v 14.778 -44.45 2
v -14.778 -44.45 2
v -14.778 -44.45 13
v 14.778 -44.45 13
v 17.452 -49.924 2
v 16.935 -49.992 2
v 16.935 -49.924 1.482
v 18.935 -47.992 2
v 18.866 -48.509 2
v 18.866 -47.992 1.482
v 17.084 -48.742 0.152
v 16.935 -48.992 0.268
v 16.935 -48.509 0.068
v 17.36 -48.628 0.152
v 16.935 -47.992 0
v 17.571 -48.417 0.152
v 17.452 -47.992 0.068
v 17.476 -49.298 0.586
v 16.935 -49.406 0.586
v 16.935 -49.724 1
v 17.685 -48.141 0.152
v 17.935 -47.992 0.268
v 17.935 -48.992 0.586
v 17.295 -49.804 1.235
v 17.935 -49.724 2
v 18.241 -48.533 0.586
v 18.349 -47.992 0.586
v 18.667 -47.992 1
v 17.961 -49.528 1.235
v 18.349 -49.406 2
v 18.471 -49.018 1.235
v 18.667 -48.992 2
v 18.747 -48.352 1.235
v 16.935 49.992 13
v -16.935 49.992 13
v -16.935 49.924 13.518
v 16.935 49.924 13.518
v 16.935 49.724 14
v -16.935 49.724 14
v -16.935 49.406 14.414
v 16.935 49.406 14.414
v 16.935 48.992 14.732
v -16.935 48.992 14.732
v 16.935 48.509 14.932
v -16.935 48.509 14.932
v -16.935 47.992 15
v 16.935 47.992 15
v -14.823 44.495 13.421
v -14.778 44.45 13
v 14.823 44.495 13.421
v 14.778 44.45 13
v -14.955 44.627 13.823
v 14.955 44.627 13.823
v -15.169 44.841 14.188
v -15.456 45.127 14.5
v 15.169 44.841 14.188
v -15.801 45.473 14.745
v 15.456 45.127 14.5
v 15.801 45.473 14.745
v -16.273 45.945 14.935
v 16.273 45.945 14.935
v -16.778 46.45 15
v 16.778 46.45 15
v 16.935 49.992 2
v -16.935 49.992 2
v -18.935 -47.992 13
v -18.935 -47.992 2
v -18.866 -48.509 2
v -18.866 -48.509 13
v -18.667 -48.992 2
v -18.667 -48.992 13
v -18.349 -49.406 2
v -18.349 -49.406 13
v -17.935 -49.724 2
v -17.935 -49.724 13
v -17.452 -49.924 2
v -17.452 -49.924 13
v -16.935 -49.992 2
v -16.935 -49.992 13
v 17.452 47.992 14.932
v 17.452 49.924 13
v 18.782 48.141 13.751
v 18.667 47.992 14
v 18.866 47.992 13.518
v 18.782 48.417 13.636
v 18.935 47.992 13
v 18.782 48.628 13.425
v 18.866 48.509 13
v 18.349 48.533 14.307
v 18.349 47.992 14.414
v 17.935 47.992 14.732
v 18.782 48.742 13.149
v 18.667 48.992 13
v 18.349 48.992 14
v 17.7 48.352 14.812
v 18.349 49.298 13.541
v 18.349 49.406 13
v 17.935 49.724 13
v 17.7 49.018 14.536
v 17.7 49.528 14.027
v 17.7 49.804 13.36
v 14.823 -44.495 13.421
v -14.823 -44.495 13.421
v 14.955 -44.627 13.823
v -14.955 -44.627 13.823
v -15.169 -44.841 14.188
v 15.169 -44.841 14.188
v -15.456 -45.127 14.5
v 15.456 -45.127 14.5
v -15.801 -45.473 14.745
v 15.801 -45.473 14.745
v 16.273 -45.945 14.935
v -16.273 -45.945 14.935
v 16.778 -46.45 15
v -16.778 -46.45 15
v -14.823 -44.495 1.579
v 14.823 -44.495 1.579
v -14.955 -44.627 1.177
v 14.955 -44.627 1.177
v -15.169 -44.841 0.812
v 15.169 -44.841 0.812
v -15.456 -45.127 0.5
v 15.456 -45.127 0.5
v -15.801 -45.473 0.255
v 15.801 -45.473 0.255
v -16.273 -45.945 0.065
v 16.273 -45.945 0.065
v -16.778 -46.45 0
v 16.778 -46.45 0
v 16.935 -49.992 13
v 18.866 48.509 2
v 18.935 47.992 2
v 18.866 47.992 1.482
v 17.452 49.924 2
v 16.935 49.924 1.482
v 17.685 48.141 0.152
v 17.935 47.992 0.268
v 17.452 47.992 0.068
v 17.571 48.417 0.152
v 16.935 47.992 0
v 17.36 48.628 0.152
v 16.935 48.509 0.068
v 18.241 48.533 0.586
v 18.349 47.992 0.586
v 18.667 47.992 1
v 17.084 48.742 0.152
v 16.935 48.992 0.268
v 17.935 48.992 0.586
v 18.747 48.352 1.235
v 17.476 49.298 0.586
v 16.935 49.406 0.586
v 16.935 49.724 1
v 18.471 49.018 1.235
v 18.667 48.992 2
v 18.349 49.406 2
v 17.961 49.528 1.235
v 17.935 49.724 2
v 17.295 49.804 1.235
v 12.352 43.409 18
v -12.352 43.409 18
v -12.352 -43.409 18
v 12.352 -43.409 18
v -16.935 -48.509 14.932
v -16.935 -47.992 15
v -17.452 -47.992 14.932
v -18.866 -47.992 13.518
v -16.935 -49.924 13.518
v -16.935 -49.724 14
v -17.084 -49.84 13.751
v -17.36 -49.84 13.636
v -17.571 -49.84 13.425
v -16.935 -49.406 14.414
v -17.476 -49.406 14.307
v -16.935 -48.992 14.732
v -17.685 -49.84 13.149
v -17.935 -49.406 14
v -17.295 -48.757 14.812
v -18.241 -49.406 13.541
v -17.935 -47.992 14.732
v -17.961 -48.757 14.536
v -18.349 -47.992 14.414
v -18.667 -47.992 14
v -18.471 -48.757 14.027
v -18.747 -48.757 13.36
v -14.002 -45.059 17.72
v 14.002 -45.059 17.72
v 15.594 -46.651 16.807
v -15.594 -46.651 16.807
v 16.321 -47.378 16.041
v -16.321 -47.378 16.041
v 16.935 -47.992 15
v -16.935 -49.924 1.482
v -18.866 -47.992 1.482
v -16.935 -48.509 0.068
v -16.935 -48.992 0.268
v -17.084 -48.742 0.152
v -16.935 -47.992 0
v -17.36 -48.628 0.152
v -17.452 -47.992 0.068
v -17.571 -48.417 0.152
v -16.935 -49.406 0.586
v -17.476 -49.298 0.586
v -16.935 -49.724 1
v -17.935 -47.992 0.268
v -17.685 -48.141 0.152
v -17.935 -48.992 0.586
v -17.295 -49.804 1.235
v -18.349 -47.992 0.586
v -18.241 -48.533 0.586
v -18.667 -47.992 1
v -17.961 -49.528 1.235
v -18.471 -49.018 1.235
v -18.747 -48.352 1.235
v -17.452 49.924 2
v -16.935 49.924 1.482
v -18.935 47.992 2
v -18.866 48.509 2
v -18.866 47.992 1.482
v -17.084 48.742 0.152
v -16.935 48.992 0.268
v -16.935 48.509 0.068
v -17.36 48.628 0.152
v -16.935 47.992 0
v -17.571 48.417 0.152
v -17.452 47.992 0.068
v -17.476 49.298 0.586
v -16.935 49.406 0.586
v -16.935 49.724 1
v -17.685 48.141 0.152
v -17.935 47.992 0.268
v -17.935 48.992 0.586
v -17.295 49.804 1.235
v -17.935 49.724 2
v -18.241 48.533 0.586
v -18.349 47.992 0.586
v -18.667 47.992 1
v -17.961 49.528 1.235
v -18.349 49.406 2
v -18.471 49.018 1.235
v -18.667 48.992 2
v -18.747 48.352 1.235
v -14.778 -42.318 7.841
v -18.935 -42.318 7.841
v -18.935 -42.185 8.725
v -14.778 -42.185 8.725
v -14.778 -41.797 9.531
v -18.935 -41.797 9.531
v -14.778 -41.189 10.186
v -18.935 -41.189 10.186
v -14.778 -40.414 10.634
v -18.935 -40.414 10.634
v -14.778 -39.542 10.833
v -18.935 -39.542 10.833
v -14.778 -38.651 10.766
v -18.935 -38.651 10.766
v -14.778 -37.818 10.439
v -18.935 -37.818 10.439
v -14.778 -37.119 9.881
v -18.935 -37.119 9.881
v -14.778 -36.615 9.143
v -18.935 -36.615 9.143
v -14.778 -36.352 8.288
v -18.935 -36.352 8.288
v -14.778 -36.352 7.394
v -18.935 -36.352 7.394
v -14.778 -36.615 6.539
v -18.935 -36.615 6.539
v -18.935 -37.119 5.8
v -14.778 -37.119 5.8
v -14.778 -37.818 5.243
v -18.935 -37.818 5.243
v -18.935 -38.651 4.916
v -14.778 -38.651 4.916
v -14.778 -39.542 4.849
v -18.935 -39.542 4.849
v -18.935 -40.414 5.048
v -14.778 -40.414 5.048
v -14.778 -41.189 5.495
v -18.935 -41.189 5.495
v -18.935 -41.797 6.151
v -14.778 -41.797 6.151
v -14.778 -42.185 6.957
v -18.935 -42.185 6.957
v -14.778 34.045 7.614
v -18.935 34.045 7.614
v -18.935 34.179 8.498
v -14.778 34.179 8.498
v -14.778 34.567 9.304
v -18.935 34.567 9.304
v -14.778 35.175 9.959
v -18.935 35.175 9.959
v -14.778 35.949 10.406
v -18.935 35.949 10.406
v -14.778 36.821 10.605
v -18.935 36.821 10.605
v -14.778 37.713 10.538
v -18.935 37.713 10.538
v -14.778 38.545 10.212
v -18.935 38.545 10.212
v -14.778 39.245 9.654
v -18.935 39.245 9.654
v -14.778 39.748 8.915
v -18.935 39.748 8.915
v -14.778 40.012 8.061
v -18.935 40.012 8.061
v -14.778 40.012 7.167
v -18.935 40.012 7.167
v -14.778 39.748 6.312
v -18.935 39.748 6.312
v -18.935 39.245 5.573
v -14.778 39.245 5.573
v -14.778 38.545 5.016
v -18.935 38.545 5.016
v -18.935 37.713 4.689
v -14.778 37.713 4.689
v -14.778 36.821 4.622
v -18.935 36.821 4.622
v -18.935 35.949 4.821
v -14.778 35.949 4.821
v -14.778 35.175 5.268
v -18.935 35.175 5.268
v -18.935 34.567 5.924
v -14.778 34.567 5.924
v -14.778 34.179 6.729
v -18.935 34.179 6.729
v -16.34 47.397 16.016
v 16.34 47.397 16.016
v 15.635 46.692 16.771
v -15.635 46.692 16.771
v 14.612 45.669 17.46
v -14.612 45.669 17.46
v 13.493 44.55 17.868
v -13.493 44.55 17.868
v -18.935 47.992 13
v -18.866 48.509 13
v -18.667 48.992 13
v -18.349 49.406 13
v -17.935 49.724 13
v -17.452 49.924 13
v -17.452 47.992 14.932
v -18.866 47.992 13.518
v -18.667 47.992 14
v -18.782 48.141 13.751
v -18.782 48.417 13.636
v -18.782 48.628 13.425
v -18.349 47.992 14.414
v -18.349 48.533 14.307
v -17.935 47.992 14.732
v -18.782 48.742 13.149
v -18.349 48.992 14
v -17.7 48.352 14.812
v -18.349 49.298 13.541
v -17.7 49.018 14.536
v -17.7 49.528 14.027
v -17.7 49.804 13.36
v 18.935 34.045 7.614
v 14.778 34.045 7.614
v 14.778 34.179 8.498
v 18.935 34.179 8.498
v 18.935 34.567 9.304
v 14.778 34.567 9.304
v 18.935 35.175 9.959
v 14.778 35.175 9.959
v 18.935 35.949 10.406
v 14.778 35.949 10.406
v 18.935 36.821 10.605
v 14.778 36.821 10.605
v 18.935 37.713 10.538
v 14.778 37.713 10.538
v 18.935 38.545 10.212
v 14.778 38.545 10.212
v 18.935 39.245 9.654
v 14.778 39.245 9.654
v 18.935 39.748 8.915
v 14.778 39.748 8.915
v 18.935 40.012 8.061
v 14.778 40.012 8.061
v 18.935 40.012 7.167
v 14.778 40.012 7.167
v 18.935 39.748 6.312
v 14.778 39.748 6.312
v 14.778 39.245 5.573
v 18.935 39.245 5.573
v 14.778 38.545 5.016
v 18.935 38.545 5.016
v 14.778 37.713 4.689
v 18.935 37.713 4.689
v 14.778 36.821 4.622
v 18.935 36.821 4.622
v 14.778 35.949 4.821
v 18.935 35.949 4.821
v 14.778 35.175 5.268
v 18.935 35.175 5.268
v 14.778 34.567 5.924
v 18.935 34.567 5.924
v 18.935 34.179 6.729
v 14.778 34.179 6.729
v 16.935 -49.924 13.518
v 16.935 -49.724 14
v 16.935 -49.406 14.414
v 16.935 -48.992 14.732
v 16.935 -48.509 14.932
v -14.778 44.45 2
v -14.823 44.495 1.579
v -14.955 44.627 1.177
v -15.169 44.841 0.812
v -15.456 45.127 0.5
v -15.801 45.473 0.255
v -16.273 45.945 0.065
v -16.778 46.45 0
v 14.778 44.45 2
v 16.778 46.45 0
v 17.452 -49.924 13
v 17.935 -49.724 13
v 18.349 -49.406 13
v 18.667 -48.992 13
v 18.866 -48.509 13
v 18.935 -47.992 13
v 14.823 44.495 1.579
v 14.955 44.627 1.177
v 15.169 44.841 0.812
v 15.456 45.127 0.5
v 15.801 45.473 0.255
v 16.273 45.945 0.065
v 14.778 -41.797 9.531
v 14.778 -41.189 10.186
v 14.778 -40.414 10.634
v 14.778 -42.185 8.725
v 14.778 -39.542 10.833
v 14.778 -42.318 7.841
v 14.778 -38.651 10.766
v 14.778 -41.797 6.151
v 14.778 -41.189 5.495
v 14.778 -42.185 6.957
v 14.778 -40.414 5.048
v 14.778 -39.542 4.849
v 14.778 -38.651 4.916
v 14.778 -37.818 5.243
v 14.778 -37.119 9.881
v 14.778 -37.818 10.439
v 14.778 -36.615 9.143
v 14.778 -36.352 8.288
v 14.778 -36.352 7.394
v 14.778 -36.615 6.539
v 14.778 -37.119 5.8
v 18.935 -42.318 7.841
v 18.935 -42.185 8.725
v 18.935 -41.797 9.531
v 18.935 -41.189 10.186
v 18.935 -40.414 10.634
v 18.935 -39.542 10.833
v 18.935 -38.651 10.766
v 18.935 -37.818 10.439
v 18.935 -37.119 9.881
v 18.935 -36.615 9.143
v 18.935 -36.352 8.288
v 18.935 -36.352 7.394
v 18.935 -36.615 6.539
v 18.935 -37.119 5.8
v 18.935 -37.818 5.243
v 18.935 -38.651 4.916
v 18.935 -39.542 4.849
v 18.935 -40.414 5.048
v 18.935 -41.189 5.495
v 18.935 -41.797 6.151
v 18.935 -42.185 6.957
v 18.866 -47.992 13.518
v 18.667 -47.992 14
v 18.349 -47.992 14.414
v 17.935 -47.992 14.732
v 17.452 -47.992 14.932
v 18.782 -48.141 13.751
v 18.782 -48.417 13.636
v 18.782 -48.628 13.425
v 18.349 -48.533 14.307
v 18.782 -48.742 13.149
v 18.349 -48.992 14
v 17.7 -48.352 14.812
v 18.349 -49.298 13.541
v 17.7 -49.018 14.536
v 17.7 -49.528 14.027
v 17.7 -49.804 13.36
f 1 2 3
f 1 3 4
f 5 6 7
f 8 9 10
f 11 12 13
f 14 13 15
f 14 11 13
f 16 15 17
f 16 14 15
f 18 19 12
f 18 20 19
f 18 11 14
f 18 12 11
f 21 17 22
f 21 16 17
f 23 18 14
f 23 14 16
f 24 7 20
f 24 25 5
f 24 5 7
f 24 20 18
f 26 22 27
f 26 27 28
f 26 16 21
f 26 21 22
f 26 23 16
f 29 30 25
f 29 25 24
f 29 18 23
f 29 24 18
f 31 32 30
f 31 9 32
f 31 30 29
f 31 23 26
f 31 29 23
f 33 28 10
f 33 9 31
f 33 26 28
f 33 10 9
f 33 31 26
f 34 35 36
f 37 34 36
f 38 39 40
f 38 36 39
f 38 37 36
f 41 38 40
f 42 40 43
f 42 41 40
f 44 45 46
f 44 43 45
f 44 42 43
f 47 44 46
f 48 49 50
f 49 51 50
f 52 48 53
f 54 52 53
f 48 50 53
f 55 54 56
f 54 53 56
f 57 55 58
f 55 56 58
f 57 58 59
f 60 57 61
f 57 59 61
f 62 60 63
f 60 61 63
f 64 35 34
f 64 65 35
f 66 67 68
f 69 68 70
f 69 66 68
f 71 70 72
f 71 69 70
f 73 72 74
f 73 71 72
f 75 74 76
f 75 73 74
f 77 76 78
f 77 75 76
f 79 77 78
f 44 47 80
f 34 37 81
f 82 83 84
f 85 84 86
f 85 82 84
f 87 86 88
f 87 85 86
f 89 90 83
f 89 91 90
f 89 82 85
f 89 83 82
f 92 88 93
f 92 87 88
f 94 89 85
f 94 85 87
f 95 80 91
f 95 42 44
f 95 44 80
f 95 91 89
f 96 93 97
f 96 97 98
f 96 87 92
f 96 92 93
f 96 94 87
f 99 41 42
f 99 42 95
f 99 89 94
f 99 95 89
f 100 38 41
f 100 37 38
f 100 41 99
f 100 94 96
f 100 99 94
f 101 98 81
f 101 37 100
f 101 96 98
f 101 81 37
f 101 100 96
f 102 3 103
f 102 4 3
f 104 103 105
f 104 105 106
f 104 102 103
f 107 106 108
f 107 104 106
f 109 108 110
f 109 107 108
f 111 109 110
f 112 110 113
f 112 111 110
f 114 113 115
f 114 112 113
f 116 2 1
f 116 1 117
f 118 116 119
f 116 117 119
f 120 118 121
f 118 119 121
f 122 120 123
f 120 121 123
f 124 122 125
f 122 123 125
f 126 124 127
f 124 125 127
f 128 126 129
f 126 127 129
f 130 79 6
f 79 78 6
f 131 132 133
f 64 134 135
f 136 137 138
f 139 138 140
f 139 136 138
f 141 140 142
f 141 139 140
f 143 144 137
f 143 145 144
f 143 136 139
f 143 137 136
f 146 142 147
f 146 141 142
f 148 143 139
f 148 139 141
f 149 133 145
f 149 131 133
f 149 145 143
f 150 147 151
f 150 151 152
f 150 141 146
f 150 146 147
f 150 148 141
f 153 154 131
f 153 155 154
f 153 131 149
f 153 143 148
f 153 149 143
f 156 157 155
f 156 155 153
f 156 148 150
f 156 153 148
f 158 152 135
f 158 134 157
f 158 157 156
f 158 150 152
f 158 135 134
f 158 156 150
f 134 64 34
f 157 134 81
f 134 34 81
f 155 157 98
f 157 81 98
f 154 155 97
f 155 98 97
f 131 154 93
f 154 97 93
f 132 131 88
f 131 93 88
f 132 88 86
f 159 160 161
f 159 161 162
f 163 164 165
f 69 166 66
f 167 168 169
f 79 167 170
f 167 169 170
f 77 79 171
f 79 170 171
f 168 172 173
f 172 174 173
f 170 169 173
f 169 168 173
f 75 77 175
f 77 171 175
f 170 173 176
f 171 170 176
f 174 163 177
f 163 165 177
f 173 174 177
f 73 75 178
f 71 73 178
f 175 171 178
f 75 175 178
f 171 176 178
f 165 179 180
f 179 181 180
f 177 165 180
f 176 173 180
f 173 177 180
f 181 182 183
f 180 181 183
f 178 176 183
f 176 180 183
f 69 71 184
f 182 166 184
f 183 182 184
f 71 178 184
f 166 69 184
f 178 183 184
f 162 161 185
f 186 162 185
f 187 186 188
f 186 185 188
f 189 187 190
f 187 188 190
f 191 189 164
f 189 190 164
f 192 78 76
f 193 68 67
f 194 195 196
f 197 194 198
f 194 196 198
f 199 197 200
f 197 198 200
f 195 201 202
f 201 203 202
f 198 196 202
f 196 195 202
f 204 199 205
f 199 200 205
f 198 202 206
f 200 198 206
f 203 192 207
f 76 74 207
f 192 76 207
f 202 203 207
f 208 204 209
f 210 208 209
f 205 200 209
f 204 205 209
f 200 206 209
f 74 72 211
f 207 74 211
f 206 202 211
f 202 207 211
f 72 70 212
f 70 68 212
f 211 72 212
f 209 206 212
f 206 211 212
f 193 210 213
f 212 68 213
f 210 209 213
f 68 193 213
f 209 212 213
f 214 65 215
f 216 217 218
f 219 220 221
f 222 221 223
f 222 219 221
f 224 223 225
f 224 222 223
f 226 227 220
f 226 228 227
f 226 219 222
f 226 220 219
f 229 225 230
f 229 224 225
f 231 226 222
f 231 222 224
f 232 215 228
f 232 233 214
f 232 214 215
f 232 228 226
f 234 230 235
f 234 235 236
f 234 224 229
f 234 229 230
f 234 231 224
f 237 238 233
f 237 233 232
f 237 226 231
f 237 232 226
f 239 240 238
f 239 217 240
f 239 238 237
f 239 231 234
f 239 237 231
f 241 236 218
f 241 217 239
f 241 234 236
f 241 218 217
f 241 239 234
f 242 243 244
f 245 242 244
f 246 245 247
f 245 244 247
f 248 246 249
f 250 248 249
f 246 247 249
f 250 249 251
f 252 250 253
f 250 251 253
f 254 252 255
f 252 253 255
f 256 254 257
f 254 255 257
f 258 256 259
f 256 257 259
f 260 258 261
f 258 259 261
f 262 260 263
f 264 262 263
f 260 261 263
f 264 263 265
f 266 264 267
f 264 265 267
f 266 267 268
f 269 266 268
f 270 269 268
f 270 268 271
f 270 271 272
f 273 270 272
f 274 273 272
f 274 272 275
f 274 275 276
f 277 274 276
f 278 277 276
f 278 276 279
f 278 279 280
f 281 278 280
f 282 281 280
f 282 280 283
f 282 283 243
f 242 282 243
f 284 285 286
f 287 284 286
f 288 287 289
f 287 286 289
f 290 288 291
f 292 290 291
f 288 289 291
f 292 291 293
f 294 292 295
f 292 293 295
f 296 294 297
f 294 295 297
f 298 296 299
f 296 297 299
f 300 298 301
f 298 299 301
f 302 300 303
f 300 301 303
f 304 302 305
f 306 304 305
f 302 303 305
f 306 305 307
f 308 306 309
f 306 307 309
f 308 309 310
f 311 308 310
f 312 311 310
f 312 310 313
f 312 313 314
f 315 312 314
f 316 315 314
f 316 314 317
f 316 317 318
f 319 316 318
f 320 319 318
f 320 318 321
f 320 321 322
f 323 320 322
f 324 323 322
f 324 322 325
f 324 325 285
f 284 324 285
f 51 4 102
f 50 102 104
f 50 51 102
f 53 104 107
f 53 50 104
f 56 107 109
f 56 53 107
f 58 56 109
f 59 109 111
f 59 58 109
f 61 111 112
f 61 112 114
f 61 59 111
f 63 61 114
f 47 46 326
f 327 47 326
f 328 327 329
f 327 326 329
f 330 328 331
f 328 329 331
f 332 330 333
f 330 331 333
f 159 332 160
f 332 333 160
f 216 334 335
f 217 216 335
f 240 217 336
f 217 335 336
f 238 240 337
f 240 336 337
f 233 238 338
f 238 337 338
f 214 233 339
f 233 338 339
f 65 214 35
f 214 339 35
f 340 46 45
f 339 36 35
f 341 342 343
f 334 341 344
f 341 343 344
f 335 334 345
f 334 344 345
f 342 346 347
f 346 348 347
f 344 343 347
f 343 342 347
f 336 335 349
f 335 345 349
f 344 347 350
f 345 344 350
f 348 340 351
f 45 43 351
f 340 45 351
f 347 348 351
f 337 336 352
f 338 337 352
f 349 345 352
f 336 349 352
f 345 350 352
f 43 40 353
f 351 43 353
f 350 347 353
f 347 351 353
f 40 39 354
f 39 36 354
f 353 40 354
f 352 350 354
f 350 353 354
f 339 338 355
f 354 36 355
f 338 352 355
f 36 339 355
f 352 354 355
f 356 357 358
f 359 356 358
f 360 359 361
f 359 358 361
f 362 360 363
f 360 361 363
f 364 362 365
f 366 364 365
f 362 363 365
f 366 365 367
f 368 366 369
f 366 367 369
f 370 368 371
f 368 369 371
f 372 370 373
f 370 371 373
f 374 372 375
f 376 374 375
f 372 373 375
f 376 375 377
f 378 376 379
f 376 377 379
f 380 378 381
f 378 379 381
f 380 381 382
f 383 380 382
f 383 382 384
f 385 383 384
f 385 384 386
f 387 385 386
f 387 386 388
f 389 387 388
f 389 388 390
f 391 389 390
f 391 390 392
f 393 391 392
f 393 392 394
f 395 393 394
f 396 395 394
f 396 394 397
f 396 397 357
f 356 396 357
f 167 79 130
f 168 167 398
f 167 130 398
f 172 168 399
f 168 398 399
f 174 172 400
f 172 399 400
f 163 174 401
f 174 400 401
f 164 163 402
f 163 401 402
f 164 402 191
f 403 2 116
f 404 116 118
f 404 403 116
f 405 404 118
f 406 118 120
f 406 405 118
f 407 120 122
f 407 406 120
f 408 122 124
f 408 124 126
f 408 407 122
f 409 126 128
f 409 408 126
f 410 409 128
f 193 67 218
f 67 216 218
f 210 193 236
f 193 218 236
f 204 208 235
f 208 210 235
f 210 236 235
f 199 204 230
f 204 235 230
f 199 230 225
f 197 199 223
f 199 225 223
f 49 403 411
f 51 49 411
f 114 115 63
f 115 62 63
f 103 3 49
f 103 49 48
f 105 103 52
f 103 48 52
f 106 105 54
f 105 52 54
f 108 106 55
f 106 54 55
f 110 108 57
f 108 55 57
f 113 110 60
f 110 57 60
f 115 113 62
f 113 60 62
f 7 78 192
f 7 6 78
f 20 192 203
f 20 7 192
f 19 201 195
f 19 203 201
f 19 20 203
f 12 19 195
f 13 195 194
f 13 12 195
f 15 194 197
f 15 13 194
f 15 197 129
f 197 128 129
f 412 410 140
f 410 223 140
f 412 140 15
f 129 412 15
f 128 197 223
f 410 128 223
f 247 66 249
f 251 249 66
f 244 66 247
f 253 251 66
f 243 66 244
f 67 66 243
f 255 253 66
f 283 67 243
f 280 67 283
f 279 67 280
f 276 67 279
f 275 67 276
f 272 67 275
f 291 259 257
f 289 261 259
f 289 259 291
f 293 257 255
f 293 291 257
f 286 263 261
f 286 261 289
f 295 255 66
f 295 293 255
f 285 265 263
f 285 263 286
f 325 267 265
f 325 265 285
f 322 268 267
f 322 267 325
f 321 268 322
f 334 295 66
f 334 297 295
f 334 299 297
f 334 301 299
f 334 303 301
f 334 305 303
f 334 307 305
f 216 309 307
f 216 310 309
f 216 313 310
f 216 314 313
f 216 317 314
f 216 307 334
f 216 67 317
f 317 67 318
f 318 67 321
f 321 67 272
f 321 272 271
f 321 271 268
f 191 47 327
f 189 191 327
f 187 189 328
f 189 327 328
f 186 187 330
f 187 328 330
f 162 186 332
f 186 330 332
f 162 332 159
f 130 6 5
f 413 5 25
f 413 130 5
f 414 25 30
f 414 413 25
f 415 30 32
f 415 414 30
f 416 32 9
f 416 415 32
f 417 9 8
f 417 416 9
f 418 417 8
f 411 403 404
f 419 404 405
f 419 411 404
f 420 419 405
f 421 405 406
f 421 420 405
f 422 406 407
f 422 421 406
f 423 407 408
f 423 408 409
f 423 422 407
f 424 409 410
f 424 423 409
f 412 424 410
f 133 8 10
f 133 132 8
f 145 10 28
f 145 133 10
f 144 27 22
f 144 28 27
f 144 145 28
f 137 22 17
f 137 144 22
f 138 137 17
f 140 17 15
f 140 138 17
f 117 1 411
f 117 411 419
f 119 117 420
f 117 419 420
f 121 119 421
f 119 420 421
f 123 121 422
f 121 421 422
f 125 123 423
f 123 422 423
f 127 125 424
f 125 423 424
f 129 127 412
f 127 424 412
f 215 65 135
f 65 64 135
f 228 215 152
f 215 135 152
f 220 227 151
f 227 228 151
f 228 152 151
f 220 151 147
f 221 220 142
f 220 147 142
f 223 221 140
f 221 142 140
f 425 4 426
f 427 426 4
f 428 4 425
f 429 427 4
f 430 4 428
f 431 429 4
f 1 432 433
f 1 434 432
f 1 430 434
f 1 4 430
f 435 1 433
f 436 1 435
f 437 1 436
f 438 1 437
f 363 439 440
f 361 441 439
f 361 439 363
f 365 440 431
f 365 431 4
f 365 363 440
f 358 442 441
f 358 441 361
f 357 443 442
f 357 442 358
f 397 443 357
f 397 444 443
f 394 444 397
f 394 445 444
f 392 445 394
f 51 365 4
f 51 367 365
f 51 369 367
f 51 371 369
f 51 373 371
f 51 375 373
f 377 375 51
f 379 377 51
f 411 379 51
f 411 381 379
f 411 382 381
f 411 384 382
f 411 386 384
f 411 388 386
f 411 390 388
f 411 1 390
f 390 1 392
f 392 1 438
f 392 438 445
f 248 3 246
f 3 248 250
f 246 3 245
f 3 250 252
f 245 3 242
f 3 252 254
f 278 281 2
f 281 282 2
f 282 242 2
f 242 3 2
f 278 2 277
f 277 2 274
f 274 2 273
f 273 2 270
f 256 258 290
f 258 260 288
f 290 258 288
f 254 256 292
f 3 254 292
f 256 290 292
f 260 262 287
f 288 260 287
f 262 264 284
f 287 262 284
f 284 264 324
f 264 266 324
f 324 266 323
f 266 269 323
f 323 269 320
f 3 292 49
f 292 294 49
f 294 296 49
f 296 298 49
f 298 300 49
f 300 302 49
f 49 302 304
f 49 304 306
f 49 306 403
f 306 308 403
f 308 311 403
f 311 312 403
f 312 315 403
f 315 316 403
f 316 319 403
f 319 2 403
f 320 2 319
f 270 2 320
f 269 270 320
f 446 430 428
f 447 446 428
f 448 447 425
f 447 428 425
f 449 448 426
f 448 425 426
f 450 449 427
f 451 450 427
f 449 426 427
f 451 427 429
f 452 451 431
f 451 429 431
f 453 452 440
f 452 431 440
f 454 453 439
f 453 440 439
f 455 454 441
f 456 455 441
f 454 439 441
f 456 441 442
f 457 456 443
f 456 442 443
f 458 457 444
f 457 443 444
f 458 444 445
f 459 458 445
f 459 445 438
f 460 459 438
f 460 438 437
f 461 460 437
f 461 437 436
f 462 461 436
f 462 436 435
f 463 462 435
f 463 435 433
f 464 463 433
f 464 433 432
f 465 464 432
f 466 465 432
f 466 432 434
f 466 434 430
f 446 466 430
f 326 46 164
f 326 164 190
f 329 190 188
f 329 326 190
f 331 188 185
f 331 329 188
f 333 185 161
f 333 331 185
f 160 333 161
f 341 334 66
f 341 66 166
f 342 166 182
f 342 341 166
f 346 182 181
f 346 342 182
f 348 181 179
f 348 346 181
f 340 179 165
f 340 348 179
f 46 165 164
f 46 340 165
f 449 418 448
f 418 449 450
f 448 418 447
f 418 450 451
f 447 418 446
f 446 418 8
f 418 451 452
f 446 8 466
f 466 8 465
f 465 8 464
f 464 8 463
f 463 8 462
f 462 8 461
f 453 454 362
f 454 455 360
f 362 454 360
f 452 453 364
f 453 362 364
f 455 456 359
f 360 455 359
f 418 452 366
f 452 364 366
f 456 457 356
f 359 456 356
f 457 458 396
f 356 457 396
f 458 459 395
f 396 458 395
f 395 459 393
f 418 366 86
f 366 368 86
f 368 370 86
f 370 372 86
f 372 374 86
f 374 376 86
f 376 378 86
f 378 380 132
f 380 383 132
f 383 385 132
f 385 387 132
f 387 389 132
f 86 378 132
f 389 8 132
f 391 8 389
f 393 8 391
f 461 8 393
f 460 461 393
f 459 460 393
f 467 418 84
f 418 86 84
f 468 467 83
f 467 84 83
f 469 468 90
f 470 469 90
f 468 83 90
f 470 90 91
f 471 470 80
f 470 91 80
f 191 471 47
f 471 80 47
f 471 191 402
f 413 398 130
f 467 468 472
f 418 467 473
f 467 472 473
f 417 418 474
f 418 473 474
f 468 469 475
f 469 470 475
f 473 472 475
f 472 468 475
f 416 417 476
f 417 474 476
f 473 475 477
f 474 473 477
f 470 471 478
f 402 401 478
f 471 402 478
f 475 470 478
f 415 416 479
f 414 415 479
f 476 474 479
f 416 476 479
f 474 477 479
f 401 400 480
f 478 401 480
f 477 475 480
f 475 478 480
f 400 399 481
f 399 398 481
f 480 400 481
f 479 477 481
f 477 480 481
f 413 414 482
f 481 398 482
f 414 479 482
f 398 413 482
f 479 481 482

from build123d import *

# Parameters (mm, degrees)
F0_W        = 37.869092077
F0_H        = 99.9836400151
F0_W_2      = 29.556363821
F0_H_2      = 88.9000073075
F1_DEPTH    = 15
F2_R        = 2
F3_W        = 33.869092077
F3_H        = 95.9836400151
F4_DEPTH    = 3
F6_D        = 6
F7_T1_DEPTH = 56.7819705518
F7_T3_DEPTH = 118.8965184899


# Not quite as in the source:
# - a fillet or chamfer that OpenCascade refuses, or shapes differently, is made with other operations: its cross-section is extruded or revolved along the edge and cut away or added


with BuildPart() as f1:
    # F0 (on Top) → F1 (new body)
    with BuildSketch(Plane.XY):
        Rectangle(F0_W, F0_H)
        Rectangle(F0_W_2, F0_H_2, mode=Mode.SUBTRACT)
    extrude(amount=F1_DEPTH)

    # F2
    f2_edges = [f1.edges().sort_by_distance(p)[0] for p in [
        (0, 49.99182, 15),
        (-18.934546, 0, 15),
        (0, -49.99182, 15),
        (18.934546, 0, 15),
        (-18.934546, 49.99182, 7.5),
        (-18.934546, -49.99182, 7.5),
        (18.934546, 49.99182, 7.5),
        (18.934546, -49.99182, 7.5),
        (14.778182, 0, 15),
        (-14.778182, 0, 15),
        (0, -44.450004, 15),
        (0, 44.450004, 15),
        (0, -44.450004, 0),
        (0, -49.99182, 0),
        (-14.778182, 0, 0),
        (18.934546, 0, 0),
        (14.778182, 0, 0),
        (0, 44.450004, 0),
        (0, 49.99182, 0),
        (-18.934546, 0, 0),
    ]]
    fillet(f2_edges, radius=F2_R)

    # F3 (on face) → F4 (join)
    with BuildSketch(Plane.XY.offset(15)):
        Rectangle(F3_W, F3_H)
    extrude(amount=F4_DEPTH)

    # F6 (through all)
    with Locations(Plane.YZ.offset(18.9345460385)):
        with Locations((-39.3181852996, 7.8409090638), (37.0454601943, 7.6136365533)):
            Hole(F6_D / 2)

    # F7: fillet of radius 5 on 4 edges, made by hand

    # F7_s2 → F7_t1 (cut)
    with BuildSketch(Plane.YZ.offset(-28.3909852759)):
        with BuildLine():
            ThreePointArc((-43.4092443126, 18), (-46.1478571001, 17.1833001327), (-47.9918200076, 15))
            Line((-47.9918200076, 15), (-47.9918200076, 18))
            Line((-47.9918200076, 18), (-43.4092443126, 18))
        make_face()
        with BuildLine():
            ThreePointArc((47.9918200076, 15), (46.1478571001, 17.1833001327), (43.4092443126, 18))
            Line((43.4092443126, 18), (47.9918200076, 18))
            Line((47.9918200076, 18), (47.9918200076, 15))
        make_face()
    extrude(amount=F7_T1_DEPTH, mode=Mode.SUBTRACT)

    # F7_s4 → F7_t3 (cut)
    with BuildSketch(Plane.XZ.offset(-59.448259245)):
        with BuildLine():
            ThreePointArc((16.9345460385, 15), (15.0905831311, 17.1833001327), (12.3519703436, 18))
            Line((12.3519703436, 18), (16.9345460385, 18))
            Line((16.9345460385, 18), (16.9345460385, 15))
        make_face()
        with BuildLine():
            ThreePointArc((-16.9345460385, 15), (-15.0905831311, 17.1833001327), (-12.3519703436, 18))
            Line((-12.3519703436, 18), (-16.9345460385, 18))
            Line((-16.9345460385, 18), (-16.9345460385, 15))
        make_face()
    extrude(amount=F7_T3_DEPTH, mode=Mode.SUBTRACT)


solid = f1.part
